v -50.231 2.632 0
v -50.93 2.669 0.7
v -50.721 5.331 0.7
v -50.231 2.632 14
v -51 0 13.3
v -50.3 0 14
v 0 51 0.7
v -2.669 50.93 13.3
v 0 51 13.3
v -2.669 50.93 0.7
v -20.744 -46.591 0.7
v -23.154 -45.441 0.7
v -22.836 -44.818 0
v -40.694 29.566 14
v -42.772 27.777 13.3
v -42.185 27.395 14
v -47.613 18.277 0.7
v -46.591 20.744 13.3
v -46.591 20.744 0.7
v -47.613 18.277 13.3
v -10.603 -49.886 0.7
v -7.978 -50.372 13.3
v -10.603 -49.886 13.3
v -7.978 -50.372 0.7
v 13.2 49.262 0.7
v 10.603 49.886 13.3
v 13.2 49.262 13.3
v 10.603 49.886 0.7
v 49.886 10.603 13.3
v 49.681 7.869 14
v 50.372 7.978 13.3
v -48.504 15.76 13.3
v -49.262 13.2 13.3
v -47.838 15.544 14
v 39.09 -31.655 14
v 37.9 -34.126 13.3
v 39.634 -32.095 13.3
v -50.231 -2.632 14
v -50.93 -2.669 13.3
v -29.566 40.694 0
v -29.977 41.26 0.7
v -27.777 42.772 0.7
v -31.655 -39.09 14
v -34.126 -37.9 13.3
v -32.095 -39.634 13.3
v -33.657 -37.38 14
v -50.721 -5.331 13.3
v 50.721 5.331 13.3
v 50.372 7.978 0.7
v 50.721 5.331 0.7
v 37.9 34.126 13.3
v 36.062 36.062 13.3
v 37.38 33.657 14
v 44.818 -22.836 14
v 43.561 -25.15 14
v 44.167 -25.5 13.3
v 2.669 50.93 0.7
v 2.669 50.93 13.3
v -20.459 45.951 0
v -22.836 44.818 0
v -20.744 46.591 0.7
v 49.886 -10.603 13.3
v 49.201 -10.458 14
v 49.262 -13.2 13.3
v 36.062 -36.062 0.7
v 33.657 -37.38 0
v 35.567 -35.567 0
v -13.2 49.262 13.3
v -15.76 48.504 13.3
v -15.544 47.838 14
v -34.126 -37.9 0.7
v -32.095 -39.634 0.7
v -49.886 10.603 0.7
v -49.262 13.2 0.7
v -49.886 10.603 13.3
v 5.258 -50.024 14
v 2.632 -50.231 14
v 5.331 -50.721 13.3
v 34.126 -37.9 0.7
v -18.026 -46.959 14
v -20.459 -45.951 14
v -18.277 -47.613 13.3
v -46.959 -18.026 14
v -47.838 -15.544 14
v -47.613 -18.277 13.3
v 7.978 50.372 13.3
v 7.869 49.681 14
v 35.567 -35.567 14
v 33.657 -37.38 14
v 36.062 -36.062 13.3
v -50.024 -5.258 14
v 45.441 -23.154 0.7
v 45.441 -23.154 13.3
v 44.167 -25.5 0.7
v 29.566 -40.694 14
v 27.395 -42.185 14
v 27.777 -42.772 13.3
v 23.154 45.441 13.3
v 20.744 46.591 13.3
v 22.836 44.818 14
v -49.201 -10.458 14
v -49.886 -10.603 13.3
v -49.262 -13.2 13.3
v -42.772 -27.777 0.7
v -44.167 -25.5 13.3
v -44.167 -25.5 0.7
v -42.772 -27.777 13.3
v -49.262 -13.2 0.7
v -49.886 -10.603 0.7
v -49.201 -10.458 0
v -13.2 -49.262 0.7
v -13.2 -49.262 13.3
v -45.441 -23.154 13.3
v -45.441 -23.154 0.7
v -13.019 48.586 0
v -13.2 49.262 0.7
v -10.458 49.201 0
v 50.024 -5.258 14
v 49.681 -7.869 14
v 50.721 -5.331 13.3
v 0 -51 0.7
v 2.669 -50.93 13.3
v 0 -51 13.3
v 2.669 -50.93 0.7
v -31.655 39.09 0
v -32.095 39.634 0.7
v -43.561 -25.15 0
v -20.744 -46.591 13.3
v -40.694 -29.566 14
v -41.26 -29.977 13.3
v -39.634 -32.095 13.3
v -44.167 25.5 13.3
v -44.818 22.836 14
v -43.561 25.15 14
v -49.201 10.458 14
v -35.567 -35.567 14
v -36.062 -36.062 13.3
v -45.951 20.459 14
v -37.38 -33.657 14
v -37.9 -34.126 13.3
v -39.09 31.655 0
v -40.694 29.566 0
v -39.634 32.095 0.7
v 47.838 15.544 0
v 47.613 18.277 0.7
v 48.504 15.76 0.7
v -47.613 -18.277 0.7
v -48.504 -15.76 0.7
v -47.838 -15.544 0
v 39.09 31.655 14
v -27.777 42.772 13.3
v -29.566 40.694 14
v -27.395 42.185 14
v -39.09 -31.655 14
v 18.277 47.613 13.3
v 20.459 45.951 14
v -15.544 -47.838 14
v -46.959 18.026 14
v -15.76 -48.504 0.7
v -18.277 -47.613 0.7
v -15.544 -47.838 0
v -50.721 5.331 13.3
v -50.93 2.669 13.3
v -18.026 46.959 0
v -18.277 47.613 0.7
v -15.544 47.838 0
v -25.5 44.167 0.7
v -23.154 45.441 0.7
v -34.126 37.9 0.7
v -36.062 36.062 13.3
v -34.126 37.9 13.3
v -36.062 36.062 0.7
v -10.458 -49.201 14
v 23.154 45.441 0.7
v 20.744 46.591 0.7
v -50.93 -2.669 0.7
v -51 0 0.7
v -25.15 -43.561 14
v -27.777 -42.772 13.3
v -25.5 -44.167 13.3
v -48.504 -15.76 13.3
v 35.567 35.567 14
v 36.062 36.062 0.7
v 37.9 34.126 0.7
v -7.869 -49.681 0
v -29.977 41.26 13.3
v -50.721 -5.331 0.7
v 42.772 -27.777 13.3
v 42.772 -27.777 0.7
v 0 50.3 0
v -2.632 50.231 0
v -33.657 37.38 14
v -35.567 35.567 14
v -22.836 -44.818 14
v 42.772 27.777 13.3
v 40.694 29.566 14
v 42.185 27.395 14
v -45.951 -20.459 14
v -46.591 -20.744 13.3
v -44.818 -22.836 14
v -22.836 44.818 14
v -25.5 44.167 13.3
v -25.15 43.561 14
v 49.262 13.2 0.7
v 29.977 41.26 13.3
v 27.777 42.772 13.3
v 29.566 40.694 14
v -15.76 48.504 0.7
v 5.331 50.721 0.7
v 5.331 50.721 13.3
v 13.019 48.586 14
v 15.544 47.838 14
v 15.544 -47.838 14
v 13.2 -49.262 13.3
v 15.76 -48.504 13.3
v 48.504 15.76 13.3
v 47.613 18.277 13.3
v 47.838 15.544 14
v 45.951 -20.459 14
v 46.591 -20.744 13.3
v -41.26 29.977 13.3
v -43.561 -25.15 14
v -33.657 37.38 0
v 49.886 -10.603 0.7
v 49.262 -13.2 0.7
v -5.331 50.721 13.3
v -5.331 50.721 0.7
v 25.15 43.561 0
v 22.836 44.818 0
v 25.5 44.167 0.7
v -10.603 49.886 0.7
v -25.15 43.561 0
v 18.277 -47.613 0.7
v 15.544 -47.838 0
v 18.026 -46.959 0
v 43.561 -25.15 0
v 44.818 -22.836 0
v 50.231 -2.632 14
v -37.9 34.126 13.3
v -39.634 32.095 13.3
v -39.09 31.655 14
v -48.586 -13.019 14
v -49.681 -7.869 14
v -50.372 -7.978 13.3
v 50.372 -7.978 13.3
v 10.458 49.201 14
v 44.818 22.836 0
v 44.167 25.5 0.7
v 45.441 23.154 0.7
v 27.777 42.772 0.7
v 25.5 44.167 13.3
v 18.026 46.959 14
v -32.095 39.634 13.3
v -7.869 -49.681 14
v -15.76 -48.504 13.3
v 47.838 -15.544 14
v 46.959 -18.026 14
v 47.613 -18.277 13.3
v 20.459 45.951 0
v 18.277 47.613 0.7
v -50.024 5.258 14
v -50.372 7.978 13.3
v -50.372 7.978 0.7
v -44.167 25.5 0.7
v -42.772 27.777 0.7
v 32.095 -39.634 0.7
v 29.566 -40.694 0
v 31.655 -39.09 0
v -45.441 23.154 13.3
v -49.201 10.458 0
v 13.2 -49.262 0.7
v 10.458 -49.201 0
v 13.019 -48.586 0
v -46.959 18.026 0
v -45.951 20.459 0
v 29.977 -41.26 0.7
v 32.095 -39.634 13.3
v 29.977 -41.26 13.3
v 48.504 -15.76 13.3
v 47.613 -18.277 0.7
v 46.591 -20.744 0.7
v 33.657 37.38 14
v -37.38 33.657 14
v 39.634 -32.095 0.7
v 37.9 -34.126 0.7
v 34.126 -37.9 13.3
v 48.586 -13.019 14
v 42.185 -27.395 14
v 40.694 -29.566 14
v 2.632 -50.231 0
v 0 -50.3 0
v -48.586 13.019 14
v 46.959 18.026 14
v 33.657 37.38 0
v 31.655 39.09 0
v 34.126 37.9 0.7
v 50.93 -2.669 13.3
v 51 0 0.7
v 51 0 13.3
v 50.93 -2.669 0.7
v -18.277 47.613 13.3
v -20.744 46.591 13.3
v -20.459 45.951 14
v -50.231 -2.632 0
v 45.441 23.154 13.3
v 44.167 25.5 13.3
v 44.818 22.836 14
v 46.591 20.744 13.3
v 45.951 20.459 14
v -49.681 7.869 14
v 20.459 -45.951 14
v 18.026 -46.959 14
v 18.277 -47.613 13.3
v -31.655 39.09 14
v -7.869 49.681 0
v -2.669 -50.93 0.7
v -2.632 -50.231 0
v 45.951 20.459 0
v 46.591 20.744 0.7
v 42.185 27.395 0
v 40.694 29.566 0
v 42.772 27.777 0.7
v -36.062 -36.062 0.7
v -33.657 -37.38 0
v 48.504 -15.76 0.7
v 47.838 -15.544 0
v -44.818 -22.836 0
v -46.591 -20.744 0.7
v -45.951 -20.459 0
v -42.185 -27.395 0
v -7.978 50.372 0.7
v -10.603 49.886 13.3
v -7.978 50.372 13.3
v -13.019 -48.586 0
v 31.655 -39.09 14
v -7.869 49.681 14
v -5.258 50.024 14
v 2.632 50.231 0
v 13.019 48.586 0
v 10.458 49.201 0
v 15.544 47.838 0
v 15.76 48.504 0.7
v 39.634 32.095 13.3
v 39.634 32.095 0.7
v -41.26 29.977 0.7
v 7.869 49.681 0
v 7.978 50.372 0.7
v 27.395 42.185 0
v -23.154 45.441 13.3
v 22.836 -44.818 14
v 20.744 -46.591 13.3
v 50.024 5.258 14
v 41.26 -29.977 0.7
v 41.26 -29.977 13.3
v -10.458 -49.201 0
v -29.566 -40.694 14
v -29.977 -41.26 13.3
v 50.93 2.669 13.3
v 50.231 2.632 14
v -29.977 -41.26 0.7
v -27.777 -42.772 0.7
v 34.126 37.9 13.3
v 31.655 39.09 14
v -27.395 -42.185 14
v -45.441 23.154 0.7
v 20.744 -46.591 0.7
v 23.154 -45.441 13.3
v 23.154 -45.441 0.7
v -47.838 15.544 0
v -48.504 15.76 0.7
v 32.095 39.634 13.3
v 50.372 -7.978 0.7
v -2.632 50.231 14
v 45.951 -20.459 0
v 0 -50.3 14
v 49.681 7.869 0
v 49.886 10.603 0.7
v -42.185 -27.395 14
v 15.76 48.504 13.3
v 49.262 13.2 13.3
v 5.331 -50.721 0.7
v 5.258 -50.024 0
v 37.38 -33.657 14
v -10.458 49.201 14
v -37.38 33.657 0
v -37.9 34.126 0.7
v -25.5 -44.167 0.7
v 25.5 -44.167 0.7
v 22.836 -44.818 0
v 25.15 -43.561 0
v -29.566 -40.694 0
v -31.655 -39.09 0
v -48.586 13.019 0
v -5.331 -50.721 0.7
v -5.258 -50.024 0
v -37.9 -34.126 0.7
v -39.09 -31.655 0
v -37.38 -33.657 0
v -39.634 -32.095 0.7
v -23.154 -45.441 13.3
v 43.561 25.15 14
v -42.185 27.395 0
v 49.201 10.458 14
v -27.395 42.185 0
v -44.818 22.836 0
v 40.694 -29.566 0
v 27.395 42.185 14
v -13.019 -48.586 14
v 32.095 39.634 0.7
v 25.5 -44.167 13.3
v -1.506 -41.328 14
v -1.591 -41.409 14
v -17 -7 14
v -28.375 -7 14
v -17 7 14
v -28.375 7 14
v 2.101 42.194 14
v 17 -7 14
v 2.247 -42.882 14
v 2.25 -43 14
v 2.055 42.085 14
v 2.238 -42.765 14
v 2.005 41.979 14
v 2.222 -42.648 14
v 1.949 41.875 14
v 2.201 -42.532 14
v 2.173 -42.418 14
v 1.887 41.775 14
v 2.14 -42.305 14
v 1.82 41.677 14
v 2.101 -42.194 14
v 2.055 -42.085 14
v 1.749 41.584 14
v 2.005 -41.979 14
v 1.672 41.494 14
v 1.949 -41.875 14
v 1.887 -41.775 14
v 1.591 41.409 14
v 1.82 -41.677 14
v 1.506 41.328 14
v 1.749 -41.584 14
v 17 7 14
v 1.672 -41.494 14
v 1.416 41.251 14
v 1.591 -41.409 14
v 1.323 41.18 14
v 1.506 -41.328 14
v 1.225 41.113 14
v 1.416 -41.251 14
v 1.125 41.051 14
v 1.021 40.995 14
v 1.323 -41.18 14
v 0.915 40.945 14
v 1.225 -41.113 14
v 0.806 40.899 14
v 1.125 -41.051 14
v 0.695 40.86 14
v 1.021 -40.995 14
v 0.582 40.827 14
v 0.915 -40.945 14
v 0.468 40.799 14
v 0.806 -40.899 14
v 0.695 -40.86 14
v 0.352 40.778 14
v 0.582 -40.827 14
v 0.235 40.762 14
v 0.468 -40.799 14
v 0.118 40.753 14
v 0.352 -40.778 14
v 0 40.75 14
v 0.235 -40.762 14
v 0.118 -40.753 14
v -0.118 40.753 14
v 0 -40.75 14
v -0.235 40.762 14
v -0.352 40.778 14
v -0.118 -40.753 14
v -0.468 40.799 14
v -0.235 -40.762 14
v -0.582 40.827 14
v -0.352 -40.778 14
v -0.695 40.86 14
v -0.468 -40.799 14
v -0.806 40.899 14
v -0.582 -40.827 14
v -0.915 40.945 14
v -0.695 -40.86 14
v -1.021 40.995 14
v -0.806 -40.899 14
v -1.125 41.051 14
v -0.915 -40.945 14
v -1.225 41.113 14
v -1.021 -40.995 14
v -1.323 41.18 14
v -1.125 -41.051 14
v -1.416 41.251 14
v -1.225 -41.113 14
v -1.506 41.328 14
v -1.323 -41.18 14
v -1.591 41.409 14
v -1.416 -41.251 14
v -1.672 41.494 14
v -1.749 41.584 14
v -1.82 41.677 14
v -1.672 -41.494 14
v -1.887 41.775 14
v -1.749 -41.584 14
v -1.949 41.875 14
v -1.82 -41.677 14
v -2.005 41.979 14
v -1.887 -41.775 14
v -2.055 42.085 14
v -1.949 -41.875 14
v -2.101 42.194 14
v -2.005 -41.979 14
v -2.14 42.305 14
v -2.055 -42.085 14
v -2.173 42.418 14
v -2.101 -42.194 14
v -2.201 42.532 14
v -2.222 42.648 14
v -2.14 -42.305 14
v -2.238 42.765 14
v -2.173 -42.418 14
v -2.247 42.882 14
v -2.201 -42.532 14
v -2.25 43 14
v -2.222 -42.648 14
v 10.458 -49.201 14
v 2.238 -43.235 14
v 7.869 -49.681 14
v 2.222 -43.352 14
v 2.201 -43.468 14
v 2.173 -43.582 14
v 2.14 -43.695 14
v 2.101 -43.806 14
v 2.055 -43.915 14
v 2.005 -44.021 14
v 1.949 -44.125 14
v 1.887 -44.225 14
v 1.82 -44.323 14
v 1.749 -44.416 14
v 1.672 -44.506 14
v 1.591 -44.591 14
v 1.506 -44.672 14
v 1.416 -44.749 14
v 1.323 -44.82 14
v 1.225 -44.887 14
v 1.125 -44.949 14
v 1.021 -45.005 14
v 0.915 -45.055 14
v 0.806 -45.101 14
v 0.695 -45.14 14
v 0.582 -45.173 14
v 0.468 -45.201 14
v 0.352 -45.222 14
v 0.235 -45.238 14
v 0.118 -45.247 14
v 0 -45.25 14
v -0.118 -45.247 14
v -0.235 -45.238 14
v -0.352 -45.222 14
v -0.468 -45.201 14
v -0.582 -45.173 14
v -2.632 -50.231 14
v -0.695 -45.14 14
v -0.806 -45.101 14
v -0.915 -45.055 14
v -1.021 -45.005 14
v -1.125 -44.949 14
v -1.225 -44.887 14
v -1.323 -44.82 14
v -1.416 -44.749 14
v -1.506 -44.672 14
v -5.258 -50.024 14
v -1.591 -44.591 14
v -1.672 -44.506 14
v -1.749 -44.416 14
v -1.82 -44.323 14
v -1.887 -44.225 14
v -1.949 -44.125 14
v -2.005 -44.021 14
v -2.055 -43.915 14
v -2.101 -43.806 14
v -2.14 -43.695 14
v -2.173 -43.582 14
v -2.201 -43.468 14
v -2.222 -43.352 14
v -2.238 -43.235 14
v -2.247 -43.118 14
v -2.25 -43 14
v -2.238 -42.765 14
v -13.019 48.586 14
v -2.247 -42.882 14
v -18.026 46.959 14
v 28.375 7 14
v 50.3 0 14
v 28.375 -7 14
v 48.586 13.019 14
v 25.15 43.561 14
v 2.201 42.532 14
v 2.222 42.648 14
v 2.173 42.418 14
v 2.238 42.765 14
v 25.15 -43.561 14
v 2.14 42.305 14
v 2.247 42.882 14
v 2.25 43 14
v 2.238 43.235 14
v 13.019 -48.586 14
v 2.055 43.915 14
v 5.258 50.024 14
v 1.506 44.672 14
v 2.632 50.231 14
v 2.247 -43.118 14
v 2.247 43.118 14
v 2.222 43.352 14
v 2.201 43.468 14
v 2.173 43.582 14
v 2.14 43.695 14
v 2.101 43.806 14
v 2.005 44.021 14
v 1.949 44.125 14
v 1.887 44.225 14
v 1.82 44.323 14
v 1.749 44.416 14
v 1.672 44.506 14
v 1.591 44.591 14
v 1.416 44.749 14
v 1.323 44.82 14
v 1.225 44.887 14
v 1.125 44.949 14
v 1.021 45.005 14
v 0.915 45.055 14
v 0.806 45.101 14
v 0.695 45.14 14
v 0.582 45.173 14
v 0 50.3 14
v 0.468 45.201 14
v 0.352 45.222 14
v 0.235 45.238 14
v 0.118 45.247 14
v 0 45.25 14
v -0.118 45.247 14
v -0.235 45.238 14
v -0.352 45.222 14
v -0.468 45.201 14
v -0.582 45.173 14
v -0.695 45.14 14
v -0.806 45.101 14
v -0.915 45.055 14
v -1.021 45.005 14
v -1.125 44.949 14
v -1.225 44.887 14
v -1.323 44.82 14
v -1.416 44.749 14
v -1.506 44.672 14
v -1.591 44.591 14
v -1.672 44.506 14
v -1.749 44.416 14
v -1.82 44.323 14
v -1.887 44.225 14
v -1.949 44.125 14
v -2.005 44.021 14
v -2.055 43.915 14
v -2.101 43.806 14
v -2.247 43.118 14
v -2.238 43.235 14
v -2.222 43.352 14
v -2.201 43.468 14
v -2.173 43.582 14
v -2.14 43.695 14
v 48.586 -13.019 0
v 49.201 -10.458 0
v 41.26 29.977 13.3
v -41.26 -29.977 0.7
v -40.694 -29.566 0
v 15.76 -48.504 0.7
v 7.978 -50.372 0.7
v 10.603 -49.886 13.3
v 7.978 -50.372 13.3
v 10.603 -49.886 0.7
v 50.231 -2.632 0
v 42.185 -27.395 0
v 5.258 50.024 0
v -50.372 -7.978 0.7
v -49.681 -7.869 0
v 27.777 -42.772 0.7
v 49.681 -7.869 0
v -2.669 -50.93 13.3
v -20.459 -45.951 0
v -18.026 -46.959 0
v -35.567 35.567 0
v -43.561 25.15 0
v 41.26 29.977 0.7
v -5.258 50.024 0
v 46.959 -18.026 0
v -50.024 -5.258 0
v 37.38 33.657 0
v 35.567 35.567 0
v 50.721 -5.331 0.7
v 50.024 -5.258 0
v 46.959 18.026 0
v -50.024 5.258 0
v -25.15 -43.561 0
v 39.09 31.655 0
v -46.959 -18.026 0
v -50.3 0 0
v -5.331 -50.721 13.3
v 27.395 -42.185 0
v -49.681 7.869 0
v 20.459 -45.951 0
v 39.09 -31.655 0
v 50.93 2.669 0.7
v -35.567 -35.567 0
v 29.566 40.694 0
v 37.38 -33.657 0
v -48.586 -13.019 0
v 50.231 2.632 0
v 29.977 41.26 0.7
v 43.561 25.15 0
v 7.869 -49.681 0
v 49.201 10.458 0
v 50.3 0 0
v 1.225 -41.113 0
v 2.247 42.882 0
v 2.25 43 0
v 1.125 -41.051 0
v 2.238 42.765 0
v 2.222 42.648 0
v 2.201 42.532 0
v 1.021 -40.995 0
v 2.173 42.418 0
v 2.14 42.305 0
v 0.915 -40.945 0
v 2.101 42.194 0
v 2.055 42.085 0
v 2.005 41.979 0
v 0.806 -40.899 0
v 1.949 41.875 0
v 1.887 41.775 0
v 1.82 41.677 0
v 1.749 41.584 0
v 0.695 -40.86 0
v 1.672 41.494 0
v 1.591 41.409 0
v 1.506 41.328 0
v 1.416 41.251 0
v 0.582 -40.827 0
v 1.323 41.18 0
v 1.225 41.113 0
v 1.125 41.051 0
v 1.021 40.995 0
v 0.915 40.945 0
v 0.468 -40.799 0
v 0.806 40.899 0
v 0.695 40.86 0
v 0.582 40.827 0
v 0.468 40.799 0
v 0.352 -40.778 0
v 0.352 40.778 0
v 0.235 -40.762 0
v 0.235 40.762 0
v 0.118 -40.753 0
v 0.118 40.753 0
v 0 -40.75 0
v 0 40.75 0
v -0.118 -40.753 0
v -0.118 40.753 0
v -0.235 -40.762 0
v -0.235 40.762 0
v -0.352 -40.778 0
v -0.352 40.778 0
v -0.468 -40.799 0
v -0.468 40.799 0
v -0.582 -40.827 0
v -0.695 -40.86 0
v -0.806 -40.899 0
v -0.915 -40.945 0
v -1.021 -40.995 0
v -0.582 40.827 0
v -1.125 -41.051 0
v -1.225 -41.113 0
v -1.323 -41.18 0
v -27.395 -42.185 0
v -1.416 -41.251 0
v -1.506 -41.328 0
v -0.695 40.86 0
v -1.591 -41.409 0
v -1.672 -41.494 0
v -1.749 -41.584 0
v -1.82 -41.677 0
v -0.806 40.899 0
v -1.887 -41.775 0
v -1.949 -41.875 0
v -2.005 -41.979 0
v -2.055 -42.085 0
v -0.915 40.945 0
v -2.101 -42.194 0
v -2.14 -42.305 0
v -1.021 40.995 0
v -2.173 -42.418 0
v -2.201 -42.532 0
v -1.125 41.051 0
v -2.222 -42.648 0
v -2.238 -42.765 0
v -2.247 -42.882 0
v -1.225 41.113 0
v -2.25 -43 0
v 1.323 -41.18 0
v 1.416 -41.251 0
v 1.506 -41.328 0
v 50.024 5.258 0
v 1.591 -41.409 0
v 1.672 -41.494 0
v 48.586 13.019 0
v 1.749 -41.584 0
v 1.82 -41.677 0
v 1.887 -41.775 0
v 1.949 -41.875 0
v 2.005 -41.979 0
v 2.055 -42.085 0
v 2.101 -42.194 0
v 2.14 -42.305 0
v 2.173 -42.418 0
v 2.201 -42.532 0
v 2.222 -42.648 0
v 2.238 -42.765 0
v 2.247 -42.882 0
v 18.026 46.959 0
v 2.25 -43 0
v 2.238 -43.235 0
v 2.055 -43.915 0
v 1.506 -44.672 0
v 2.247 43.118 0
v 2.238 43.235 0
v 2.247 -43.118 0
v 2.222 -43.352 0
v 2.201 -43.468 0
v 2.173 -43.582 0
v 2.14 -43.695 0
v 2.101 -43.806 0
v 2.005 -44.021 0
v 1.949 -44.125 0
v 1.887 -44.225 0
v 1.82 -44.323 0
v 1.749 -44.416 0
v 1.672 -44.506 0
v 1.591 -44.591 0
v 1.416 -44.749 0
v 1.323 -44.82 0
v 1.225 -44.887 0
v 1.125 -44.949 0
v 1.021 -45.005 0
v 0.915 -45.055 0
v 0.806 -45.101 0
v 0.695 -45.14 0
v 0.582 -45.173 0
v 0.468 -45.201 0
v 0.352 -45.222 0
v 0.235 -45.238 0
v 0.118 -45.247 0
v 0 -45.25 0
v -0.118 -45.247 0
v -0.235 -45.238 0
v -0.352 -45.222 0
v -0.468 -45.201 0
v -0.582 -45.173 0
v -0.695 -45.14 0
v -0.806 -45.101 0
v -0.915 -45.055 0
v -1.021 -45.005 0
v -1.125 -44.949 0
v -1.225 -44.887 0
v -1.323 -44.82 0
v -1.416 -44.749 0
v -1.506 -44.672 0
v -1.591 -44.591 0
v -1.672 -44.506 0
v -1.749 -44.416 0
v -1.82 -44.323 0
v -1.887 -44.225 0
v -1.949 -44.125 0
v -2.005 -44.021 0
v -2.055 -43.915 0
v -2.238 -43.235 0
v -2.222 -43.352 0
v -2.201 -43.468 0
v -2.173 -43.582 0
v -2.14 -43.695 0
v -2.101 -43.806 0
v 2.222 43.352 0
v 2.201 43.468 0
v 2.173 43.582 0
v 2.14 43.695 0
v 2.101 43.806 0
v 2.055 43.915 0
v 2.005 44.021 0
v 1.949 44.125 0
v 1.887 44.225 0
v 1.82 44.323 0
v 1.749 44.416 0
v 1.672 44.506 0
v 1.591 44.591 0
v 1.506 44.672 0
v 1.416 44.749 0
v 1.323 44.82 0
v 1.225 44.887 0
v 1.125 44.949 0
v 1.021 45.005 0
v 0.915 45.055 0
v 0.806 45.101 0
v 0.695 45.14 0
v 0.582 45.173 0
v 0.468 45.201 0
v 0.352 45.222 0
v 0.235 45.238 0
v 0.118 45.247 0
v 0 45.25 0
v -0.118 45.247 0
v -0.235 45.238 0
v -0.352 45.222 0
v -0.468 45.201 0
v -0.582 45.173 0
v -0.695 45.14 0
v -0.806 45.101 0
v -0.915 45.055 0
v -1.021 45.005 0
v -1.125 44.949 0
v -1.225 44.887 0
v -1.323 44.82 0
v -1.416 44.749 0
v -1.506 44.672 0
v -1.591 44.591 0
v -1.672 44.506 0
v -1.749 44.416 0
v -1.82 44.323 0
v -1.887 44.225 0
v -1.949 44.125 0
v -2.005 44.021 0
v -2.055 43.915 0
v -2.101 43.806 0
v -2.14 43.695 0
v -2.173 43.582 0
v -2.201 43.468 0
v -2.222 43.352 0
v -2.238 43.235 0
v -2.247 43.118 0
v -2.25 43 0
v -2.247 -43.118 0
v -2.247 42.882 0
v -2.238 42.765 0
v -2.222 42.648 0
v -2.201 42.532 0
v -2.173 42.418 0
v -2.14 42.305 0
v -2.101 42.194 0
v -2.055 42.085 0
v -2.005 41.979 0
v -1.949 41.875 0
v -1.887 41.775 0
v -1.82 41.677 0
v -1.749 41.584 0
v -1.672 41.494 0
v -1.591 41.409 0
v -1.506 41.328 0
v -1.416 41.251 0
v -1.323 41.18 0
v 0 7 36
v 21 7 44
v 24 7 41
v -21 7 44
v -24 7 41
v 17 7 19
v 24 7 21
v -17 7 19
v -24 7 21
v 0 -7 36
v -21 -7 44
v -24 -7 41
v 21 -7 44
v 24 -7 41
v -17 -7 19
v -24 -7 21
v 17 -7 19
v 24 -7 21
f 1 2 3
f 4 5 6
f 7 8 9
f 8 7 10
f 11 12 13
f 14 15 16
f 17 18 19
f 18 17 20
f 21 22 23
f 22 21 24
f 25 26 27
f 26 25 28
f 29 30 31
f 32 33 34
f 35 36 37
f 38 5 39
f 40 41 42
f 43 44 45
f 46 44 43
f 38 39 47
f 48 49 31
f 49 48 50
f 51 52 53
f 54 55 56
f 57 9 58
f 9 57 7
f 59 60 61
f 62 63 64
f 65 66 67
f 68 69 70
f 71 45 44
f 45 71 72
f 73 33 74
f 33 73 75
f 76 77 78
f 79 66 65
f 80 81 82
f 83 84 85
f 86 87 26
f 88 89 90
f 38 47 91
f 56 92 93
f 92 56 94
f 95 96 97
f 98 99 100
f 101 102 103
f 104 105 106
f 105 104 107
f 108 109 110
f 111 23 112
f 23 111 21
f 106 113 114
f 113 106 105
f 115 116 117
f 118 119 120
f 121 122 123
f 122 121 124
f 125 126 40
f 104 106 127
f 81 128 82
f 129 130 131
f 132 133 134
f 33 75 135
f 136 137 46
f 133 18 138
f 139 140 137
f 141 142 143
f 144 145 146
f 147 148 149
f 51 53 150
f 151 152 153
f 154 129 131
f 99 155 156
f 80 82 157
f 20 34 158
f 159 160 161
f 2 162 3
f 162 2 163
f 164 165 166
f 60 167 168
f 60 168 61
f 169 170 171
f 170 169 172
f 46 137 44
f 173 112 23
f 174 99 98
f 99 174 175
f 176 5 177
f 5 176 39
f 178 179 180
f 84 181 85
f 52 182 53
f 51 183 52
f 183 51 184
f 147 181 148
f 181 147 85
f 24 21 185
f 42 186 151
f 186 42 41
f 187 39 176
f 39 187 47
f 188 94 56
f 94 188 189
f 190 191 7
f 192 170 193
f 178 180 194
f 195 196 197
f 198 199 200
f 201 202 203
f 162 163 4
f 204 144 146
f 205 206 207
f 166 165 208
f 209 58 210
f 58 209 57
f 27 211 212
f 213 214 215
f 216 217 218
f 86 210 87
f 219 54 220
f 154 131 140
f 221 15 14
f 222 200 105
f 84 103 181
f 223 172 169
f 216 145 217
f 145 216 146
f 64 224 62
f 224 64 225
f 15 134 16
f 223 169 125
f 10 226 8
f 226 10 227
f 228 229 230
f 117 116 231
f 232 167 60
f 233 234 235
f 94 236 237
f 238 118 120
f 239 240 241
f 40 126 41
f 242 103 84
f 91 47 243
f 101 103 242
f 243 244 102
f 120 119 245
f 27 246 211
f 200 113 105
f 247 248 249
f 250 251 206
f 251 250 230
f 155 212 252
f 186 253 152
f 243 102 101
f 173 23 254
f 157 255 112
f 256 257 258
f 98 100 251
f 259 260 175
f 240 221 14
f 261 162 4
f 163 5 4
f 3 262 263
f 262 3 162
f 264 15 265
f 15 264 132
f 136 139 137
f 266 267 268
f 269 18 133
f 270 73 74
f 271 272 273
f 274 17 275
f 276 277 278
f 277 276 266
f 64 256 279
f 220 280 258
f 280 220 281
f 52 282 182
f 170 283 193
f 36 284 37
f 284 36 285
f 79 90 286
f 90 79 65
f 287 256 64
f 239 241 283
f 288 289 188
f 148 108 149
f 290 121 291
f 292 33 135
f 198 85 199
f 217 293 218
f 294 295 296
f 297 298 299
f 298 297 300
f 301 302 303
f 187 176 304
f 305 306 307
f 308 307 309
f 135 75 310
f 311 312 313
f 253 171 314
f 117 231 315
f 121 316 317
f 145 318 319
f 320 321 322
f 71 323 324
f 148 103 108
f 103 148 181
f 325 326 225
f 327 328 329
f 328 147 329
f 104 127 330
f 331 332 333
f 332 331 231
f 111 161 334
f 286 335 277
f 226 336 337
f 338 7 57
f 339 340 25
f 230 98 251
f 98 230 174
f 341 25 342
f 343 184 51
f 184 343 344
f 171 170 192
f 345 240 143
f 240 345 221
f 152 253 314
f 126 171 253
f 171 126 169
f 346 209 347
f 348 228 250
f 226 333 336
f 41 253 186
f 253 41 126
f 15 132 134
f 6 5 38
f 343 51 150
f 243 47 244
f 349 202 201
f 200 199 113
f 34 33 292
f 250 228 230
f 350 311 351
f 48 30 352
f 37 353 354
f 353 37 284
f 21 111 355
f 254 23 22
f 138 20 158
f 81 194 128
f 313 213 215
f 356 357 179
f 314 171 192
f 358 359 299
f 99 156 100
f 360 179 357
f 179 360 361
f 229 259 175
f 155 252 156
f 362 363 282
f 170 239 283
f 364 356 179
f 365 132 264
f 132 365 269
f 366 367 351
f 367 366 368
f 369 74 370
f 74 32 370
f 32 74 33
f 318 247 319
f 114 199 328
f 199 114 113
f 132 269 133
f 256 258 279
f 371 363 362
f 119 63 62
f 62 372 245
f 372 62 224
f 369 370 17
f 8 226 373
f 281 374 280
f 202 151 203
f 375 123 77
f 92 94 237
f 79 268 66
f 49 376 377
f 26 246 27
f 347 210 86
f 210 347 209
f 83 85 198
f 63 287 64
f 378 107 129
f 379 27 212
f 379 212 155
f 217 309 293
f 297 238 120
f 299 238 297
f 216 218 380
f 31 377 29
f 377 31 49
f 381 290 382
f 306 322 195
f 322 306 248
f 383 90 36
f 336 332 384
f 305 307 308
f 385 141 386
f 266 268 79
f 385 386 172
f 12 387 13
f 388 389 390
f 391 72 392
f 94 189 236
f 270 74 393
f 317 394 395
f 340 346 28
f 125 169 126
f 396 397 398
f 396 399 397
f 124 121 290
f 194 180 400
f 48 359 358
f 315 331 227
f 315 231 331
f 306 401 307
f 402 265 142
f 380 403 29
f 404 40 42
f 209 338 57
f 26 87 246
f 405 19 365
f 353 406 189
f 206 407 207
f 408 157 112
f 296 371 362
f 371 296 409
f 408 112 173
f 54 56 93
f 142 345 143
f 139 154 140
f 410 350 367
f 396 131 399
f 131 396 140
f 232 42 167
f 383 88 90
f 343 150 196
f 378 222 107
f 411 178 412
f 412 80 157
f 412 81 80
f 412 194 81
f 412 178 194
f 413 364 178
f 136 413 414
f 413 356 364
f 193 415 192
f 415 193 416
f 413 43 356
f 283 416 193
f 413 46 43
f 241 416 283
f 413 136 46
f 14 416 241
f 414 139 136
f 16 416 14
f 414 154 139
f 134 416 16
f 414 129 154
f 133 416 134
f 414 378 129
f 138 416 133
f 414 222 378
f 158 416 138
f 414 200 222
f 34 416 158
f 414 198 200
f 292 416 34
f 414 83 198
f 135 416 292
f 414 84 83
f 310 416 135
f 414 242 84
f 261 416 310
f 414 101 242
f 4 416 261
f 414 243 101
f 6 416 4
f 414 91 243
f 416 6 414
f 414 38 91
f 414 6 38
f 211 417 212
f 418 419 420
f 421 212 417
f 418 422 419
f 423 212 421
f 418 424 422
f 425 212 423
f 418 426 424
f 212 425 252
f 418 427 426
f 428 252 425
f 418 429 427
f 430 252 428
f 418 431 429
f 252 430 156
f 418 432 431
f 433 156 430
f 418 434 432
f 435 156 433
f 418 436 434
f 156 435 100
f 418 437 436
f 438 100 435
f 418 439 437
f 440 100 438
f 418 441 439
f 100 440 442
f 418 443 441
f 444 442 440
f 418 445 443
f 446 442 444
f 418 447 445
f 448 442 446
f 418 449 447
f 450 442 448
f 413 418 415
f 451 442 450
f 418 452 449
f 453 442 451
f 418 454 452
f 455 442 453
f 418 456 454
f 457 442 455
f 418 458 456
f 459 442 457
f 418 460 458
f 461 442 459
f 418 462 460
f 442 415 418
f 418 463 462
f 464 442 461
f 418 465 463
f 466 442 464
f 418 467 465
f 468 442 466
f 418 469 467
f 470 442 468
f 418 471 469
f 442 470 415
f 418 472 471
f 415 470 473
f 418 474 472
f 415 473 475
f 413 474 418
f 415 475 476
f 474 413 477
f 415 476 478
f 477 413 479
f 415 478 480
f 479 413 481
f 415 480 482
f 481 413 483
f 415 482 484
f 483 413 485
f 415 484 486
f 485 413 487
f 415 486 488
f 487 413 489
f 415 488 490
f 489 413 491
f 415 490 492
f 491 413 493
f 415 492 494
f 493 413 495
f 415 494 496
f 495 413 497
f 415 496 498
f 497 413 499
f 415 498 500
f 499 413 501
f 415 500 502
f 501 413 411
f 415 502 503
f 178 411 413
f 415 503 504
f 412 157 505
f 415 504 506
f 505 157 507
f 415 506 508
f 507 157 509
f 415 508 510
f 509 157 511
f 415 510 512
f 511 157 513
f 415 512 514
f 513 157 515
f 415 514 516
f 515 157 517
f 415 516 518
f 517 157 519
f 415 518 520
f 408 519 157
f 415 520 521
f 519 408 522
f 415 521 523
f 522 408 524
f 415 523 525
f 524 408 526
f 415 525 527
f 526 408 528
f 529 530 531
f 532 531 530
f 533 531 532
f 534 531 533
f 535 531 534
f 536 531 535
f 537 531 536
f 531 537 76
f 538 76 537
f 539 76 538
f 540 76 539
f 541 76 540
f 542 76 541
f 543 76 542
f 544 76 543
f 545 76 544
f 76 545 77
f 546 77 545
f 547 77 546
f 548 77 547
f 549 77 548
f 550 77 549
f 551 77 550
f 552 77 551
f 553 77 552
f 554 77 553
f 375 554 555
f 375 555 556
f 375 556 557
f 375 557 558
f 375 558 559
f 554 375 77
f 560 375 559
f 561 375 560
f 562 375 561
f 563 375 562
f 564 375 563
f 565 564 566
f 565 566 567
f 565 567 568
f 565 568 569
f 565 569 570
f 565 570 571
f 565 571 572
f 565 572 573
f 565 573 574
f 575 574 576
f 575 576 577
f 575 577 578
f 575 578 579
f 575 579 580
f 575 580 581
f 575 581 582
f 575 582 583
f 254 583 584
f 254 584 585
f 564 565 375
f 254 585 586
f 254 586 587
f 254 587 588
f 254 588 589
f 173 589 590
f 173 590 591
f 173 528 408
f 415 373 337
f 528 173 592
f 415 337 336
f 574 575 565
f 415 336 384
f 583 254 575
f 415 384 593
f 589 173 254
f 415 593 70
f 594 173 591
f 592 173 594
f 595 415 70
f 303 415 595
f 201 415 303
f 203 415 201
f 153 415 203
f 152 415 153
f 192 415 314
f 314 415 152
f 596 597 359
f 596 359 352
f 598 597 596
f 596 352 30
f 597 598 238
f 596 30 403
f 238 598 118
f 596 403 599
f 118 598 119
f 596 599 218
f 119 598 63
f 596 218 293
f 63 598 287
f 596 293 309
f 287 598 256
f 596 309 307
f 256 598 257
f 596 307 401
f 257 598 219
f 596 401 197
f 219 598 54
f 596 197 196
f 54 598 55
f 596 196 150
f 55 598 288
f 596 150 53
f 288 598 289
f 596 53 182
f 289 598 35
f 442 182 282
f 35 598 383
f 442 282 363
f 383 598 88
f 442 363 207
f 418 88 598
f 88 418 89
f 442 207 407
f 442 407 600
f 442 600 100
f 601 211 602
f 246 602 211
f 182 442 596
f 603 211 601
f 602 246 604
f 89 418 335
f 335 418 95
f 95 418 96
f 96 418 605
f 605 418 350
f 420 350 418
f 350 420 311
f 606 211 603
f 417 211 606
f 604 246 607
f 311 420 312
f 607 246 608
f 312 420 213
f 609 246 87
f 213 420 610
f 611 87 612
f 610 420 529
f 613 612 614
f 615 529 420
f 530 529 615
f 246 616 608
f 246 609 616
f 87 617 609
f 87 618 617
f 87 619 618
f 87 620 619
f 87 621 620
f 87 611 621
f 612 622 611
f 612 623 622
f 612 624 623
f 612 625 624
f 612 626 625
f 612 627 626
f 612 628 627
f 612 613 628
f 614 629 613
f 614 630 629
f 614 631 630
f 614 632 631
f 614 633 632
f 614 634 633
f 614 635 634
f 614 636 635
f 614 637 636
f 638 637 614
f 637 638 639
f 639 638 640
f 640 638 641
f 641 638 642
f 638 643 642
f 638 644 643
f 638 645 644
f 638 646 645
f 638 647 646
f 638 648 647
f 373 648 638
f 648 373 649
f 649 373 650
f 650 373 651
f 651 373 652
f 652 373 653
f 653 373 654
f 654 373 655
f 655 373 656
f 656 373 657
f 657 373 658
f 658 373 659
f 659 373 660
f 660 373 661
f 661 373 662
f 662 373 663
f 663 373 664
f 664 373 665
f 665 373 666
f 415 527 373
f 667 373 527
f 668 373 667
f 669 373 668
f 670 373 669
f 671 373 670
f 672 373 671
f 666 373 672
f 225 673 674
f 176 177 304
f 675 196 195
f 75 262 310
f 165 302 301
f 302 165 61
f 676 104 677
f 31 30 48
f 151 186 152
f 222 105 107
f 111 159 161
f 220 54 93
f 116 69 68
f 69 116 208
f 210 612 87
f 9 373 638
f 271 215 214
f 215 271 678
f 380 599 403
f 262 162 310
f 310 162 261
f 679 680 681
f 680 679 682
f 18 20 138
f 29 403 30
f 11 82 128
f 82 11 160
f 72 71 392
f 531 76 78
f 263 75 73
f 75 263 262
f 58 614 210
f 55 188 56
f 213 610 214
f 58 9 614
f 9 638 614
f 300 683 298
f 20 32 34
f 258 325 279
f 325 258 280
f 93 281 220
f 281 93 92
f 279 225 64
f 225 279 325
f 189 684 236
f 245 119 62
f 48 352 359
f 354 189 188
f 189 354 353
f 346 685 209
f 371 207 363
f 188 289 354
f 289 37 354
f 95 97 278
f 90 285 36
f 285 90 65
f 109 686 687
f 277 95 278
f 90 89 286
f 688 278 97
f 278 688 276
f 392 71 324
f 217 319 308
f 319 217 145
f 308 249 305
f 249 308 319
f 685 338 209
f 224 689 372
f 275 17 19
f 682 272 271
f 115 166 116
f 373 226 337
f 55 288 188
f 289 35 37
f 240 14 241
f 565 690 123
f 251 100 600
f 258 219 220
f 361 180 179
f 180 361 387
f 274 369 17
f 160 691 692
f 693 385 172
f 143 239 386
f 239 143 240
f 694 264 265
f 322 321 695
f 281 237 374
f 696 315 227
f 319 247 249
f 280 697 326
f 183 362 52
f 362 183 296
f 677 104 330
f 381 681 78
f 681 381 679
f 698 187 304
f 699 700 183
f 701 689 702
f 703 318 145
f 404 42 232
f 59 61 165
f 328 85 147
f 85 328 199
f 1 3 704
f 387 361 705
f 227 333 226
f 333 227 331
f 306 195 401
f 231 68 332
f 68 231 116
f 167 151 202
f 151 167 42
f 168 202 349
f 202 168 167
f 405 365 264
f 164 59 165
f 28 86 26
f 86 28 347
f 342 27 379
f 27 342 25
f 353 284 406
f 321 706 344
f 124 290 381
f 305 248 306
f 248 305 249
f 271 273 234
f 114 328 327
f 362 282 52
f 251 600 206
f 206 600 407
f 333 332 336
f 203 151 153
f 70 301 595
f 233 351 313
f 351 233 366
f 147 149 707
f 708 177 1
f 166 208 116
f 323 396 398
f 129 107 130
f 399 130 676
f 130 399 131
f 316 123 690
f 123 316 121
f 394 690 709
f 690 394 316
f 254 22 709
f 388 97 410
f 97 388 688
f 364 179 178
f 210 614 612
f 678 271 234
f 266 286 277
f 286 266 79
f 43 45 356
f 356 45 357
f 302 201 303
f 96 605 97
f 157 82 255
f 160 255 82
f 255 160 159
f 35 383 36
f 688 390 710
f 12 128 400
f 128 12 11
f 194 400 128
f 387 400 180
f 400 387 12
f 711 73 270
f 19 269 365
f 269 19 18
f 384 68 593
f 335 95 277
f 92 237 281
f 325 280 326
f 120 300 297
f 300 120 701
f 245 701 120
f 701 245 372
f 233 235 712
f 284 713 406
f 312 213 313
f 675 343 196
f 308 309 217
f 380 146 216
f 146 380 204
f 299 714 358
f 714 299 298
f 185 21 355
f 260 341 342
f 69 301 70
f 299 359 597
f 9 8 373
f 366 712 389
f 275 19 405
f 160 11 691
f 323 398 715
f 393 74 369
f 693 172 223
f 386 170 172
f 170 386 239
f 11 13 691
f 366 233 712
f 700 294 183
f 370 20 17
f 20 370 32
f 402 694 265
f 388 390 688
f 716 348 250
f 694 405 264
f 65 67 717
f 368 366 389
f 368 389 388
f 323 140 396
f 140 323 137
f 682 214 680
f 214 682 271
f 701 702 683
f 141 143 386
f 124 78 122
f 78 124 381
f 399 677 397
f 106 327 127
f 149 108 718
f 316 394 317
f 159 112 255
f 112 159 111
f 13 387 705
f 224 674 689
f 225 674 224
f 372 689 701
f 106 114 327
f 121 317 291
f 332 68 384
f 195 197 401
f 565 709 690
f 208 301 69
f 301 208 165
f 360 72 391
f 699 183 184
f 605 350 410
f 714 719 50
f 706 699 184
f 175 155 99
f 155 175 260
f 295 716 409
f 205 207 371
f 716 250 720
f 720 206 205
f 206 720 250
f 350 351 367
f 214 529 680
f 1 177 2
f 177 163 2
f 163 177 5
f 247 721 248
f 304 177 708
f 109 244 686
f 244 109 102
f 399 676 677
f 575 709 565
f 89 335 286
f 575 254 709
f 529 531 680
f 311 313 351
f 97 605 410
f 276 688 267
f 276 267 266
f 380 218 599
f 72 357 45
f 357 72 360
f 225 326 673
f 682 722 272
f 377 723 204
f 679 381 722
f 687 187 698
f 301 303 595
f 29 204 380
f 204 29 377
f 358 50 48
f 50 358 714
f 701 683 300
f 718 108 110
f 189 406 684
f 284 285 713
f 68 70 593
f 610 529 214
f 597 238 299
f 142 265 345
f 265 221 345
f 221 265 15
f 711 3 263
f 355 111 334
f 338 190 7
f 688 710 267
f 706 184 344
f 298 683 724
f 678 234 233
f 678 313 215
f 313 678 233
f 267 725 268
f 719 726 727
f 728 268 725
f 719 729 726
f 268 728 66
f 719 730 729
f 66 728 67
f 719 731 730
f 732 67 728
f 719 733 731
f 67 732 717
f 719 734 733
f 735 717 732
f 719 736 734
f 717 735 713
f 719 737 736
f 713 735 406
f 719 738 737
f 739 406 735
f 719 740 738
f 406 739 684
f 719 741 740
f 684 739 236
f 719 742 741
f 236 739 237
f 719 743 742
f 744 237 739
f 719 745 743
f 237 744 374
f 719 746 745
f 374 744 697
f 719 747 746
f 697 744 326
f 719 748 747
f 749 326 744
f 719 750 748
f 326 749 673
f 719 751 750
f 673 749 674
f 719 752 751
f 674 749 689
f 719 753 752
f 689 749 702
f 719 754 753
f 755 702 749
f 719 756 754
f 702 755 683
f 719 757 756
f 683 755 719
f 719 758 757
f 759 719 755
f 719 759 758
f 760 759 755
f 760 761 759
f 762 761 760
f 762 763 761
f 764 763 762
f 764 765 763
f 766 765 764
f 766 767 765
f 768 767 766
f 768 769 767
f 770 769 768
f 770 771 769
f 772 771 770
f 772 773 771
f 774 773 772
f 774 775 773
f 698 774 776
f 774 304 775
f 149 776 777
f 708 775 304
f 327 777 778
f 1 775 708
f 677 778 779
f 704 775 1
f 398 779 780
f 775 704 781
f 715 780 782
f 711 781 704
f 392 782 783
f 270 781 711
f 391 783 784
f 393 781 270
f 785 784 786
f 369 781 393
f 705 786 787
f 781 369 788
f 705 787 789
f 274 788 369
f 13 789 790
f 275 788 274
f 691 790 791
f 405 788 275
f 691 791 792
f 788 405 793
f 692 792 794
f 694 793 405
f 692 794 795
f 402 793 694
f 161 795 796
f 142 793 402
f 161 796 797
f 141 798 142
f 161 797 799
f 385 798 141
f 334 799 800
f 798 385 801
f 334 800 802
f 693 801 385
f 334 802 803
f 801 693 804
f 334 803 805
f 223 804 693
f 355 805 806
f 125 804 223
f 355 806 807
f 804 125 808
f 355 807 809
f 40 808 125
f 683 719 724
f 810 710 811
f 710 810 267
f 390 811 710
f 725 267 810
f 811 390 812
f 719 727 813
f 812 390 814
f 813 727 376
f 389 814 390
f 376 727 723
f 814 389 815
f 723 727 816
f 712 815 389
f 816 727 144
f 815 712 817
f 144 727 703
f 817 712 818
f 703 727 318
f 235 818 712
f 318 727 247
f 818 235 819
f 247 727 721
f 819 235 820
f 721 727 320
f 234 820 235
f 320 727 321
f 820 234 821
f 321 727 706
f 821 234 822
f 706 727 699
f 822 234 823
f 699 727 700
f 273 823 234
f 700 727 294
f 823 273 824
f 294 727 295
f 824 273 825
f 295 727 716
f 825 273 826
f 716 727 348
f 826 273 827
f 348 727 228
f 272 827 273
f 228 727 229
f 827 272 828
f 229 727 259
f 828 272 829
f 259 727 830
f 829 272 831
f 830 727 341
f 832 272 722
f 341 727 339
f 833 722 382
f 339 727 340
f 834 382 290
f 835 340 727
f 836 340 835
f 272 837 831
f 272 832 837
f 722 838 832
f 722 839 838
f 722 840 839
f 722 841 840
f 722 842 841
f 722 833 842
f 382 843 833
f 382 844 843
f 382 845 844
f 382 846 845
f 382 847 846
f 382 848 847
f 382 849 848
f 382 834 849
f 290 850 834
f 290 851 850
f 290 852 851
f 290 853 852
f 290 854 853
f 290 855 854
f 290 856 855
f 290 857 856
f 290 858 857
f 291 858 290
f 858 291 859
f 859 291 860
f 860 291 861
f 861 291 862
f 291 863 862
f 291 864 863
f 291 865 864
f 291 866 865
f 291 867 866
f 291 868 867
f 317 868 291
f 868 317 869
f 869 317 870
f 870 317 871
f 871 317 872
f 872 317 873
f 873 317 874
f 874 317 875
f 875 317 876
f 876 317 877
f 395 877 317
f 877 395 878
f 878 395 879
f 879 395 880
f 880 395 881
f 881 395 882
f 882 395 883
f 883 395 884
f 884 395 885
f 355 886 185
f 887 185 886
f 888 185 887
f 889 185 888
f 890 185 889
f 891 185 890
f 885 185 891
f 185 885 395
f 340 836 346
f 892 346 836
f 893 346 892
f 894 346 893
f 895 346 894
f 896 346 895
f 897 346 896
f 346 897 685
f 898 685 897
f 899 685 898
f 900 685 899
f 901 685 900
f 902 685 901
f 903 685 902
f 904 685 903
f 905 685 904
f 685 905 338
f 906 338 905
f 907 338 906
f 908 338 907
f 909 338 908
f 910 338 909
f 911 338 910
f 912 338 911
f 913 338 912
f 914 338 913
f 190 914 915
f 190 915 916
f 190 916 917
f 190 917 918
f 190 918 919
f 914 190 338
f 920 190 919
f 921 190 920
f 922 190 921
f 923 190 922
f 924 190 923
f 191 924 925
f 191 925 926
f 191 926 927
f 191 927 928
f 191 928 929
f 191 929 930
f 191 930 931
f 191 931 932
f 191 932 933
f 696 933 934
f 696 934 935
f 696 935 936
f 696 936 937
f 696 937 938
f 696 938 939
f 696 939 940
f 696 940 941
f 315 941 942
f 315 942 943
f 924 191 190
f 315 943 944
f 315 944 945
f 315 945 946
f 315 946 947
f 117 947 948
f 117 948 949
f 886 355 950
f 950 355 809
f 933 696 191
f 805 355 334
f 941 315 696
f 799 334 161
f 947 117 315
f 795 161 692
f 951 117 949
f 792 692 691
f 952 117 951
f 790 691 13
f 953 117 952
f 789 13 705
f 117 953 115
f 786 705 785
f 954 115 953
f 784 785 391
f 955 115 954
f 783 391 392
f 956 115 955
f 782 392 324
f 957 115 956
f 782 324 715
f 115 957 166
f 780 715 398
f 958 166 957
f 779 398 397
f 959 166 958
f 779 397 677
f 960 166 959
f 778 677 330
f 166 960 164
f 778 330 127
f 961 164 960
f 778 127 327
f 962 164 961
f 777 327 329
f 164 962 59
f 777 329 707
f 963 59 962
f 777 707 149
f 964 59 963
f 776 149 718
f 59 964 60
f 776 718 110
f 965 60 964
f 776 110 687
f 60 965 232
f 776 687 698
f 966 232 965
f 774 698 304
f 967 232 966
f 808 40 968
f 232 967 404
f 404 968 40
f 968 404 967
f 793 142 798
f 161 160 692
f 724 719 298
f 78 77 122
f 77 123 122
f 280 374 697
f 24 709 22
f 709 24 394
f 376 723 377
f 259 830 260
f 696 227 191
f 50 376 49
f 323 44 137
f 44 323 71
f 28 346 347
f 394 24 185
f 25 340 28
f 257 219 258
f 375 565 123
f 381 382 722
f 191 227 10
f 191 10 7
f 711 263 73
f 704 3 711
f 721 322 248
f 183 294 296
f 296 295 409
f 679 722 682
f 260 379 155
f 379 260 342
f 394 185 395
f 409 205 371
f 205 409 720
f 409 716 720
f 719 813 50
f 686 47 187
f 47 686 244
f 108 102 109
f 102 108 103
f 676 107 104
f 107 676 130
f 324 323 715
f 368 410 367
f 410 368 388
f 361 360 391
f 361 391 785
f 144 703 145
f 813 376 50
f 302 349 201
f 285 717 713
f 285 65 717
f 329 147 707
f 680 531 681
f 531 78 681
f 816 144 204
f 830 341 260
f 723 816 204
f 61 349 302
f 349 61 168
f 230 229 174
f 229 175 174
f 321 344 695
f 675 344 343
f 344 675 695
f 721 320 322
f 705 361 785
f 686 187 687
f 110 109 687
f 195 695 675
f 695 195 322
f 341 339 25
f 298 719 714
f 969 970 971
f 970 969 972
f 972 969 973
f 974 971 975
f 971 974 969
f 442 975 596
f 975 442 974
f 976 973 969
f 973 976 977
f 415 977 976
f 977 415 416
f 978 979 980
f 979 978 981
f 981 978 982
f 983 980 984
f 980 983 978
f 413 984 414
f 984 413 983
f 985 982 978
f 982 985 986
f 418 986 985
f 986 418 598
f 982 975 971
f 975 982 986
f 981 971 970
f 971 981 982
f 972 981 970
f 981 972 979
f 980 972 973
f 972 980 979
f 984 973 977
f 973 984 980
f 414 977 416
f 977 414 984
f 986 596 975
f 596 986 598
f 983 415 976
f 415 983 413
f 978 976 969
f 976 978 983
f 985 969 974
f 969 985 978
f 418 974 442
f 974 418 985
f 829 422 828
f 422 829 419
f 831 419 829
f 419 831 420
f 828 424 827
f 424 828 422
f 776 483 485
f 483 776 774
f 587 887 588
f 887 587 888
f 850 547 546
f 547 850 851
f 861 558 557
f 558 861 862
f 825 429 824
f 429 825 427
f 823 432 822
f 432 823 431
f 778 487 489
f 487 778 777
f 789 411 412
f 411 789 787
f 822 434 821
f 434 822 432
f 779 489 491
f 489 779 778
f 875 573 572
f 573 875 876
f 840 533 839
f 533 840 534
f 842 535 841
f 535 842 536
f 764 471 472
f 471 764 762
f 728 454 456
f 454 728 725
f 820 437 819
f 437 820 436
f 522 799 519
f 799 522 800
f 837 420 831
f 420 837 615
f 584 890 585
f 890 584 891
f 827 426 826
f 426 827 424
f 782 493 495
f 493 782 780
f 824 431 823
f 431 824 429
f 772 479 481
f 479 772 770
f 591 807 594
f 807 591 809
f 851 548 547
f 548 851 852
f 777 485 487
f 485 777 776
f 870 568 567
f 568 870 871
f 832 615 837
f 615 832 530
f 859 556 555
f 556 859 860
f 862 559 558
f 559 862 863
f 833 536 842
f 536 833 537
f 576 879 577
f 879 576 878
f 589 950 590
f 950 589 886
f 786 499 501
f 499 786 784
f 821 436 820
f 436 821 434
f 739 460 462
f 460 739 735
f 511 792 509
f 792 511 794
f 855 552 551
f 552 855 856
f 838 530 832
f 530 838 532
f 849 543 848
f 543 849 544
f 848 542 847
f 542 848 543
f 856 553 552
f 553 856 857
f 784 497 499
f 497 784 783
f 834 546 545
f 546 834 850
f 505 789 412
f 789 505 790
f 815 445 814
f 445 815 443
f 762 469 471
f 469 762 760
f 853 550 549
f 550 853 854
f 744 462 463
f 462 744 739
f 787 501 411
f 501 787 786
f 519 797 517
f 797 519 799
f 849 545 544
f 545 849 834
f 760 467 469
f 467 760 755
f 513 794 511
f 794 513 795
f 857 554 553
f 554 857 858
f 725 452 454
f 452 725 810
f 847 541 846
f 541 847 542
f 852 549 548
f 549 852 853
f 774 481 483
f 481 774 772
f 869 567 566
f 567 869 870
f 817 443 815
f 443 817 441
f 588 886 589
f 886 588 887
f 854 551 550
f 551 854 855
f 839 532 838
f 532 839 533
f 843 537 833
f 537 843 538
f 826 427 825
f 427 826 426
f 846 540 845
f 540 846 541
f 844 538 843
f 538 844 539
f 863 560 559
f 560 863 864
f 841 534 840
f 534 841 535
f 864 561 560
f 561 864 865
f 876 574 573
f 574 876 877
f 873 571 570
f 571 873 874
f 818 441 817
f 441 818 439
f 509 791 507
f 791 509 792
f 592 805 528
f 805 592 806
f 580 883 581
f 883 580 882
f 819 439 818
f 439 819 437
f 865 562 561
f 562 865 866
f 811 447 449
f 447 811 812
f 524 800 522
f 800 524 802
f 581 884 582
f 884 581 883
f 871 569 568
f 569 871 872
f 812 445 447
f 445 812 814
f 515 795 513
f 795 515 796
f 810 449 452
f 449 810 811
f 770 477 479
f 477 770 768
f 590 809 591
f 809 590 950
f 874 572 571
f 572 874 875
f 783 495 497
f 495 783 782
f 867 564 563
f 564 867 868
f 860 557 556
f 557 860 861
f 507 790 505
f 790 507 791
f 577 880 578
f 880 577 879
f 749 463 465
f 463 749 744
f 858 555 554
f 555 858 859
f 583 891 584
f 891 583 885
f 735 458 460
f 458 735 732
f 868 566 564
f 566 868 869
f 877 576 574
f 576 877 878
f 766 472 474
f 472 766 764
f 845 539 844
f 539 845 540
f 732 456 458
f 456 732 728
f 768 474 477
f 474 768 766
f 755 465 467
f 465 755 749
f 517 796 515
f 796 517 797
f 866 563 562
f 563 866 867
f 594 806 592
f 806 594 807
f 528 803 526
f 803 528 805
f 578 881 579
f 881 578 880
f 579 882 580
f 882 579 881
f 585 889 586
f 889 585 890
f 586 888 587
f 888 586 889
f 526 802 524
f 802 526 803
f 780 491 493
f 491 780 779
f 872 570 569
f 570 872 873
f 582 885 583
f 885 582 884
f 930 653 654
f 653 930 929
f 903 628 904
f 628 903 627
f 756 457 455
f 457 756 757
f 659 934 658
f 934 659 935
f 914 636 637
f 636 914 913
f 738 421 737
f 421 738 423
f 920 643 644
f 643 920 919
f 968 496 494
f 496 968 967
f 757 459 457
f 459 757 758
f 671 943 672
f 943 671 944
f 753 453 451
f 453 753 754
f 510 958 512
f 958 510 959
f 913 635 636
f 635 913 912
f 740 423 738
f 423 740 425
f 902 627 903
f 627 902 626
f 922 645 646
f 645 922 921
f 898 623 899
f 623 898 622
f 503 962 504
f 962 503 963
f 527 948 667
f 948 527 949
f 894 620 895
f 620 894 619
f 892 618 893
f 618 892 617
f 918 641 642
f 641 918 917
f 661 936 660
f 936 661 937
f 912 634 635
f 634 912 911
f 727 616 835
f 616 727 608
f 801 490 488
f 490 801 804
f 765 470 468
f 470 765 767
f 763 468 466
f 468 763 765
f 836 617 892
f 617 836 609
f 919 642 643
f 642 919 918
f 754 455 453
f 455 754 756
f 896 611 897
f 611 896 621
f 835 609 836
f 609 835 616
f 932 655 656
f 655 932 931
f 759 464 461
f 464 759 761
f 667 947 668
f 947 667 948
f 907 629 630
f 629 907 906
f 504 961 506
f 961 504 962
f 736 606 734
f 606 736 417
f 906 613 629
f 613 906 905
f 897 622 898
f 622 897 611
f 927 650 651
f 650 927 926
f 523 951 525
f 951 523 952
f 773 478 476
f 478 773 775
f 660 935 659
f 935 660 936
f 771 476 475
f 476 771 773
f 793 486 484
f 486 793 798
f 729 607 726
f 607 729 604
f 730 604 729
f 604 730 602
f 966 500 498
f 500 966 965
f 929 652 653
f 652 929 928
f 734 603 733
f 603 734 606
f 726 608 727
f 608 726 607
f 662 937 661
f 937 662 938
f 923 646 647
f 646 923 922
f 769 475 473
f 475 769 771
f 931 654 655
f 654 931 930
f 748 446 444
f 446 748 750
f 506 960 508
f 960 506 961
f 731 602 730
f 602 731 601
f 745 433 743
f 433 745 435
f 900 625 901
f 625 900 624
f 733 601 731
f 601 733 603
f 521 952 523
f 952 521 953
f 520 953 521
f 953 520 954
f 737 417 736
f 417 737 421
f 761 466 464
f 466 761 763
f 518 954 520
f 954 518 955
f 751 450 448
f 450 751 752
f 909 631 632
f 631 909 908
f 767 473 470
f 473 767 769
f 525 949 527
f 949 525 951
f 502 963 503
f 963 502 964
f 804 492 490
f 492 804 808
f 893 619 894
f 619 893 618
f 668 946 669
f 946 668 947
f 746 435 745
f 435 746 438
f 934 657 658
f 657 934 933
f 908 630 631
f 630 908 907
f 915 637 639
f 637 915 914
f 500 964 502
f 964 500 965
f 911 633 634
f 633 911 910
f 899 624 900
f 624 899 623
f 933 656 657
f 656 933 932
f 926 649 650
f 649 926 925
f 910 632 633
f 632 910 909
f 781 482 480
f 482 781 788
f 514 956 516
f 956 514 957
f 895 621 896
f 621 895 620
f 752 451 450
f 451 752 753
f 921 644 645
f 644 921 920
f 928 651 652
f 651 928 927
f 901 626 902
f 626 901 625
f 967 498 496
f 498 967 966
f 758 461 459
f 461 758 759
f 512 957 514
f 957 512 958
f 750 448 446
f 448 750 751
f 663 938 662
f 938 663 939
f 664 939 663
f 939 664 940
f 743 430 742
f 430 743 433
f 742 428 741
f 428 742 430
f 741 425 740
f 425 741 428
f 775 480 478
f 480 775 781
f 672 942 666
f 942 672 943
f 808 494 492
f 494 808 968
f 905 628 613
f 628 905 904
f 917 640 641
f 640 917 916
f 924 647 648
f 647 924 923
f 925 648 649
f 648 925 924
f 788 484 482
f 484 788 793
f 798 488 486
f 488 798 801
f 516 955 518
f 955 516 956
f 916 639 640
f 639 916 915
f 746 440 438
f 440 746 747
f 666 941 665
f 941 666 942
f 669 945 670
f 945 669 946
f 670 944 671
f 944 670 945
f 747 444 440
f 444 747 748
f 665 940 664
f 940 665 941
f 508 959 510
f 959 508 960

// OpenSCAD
// Rev G | integral rear finger pull | mm
// Rear access required. Print battery-contact face down, grip up.
// Rear plate retains the Rev F M4 pattern and battery contact plane.
// Allow 30 mm behind the rear plate for the grip plus cap clearance.
// Check finger access with the rear cap removed. Use M4 washers and locknuts.
// OpenSCAD "assembly" shows the orientation. Battery shapes are approximate.
part = "rear";
bore_min = 103;
diametral_gap = 1.0;
length_axial = 40;
land_width = 8;
ring_wall = 6;
shell_wall = 7;
mid_relief = 0.35; // Radial relief between the two pipe-contact lands
rod_tube_od = 13;
deck_thickness = 10;
standoff_height = 4;
spacer_od = 9;
spacer_bore = 3.6;
screw_clearance = 3.4;
lead_chamfer = 0.7;


battery_length = 113;
rod_y = 43;
rod_hole = 4.5;
ear_radius = 5.5;
saddle_thickness = 6;
finger_length = 6;
finger_inner_y = 34; // Photo estimate, measured from tube axis
finger_width = 3;
finger_x = 22; // Contacts at battery side only
finger_depth_x = 7;
front_cable_gap = 30;
end_pad = 1;
rear_thickness = 14;
middle_bridge_x = 39;
middle_bridge_radius = 4;
grip_height = 30;
grip_thickness = 14;
grip_half_width = 29;
grip_open_half_width = 17;
grip_open_shoulder = 5;
grip_open_peak = grip_open_shoulder + grip_open_half_width;

$fn = 120;
r = (bore_min - diametral_gap) / 2;
body_length = length_axial - standoff_height;
hole_centers = [for (x = [-15, 15], y = [-31, 31]) [x, y]];
rod_positions = [-rod_y, rod_y];
pack_front = -front_cable_gap;
pack_back = pack_front - battery_length;
rear_start = pack_back - end_pad - rear_thickness;

assert(part == "middle" || part == "front" || part == "rear" ||
       part == "gauge" || part == "spacer" || part == "assembly", "Unknown part.");
assert(rod_y + rod_tube_od / 2 <= r - lead_chamfer,
       "Rod sleeves exceed the entry chamfer.");
assert(rod_y + rod_tube_od / 2 > r - mid_relief - shell_wall,
       "Rod sleeves must overlap the sidewall.");
assert(2 * (land_width + mid_relief) < body_length && deck_thickness < body_length,
       "Check front insert axial dimensions.");
assert(rod_y + ear_radius < r - lead_chamfer, "Rod ears exceed fit diameter.");
assert(norm([finger_x + finger_depth_x, finger_inner_y + finger_width]) < r,
       "Locating fingers exceed fit diameter.");
assert(rod_y - rod_hole / 2 > 31 + screw_clearance / 2,
       "Check DIN mounting hole clearance.");

echo(guide_od = 2 * r, rod_spacing = 2 * rod_y,
     assembly_length_excluding_device_and_hardware = length_axial - rear_start + grip_height);

module rod_bores(start, depth) {
    for (y = rod_positions)
        translate([0, y, start])
            cylinder(d = rod_hole, h = depth);
}

module end_land() {
    cylinder(h = lead_chamfer, r1 = r - lead_chamfer, r2 = r);
    translate([0, 0, lead_chamfer])
        cylinder(h = land_width - 2 * lead_chamfer, r = r);
    translate([0, 0, land_width - lead_chamfer])
        cylinder(h = lead_chamfer, r1 = r, r2 = r - lead_chamfer);
}

module annular_land() {
    difference() {
        end_land();
        translate([0, 0, -1])
            cylinder(h = land_width + 2, r = r - ring_wall);
    }
}

// Continuous wall carries transverse shear and torsion between the lands.
module front_outer_profile() {
    rotate_extrude()
        polygon([
            [0, 0], [r - lead_chamfer, 0], [r, lead_chamfer],
            [r, land_width], [r - mid_relief, land_width + mid_relief],
            [r - mid_relief, body_length - land_width - mid_relief],
            [r, body_length - land_width], [r, body_length - lead_chamfer],
            [r - lead_chamfer, body_length], [0, body_length]
        ]);
}

module insert() {
    difference() {
        union() {
            difference() {
                front_outer_profile();
                translate([0, 0, -1])
                    cylinder(h = body_length - deck_thickness + 1,
                             r = r - mid_relief - shell_wall);
            }
            // Full-height sleeves merge into the wall and support M4 clamping.
            for (y = rod_positions)
                translate([0, y, 0])
                    cylinder(h = body_length, d = rod_tube_od);
        }
        for (p = hole_centers)
            translate([p[0], p[1], body_length - deck_thickness - 1])
                cylinder(h = deck_thickness + 2,
                         d = screw_clearance);
        rod_bores(-1, body_length + 2);
        // Rounded corners reduce stress concentration at the cable window.
        translate([0, 0, body_length - deck_thickness - 1])
            linear_extrude(height = deck_thickness + 2)
                hull() for (x = [-10, 10], y = [-7, 7])
                    translate([x, y]) circle(r = 2);
    }
}

assert(grip_height > grip_open_peak && grip_half_width > grip_open_half_width,
       "Grip opening must leave material on top and both sides.");
assert(norm([grip_half_width, grip_thickness/2]) < r - lead_chamfer,
       "Grip must fit inside the rear plate.");

module rear_grip() {
    // Roof rises 1 mm per mm inward. Every roof layer grows from the sidewalls.
    translate([0, 0, rear_thickness])
        rotate([90, 0, 0])
            linear_extrude(height = grip_thickness, center = true)
                difference() {
                    polygon([[-grip_half_width, -1], [grip_half_width, -1],
                             [grip_half_width - 5, 7], [grip_half_width - 5, grip_height - 3],
                             [grip_half_width - 8, grip_height], [-grip_half_width + 8, grip_height],
                             [-grip_half_width + 5, grip_height - 3], [-grip_half_width + 5, 7]]);
                    polygon([[-grip_open_half_width, 0], [grip_open_half_width, 0],
                             [grip_open_half_width, grip_open_shoulder], [0, grip_open_peak],
                             [-grip_open_half_width, grip_open_shoulder]]);
                }
}

module rear_plate() {
    difference() {
        union() {
            rotate_extrude()
                polygon([[0, 0], [r-lead_chamfer, 0], [r, lead_chamfer],
                         [r, rear_thickness-lead_chamfer],
                         [r-lead_chamfer, rear_thickness], [0, rear_thickness]]);
            rear_grip();
        }
        rod_bores(-1, rear_thickness + 2);
    }
}

module middle_bracket() {
    difference() {
        union() {
            linear_extrude(height = saddle_thickness)
                union() {
                    // Move the bridge to the right of the battery indicator.
                    hull() for (side = [-1, 1])
                        translate([middle_bridge_x, side * 15])
                            circle(r = middle_bridge_radius);
                    for (side = [-1, 1]) {
                        hull() {
                            translate([0, side * rod_y]) circle(r = ear_radius);
                            translate([finger_x + finger_depth_x/2,
                                       side * (finger_inner_y - 2)]) circle(r = 4);
                        }
                        hull() {
                            translate([finger_x + finger_depth_x/2,
                                       side * (finger_inner_y - 2)]) circle(r = 4);
                            translate([middle_bridge_x, side * 15])
                                circle(r = middle_bridge_radius);
                        }
                    }
                }
            for (side = [-1, 1])
                translate([finger_x,
                           side > 0 ? finger_inner_y : -finger_inner_y-finger_width,
                           saddle_thickness - 1])
                    cube([finger_depth_x, finger_width, finger_length + 1]);
        }
        rod_bores(-1, saddle_thickness + 2);
    }
}

module spacer() {
    difference() {
        cylinder(d = spacer_od, h = standoff_height);
        translate([0, 0, -1])
            cylinder(d = spacer_bore, h = standoff_height + 2);
    }
}

module assembly() {
    color("steelblue") insert();
    for (p = hole_centers)
        color("steelblue") translate([p[0], p[1], body_length]) spacer();
    color("steelblue") translate([0, 0, rear_start + rear_thickness])
        rotate([180, 0, 0]) rear_plate();
    color("orange") translate([0, 0, pack_front + end_pad + saddle_thickness])
        rotate([180, 0, 0]) middle_bracket();
    for (y = rod_positions)
        color("silver") translate([0, y, rear_start])
            cylinder(d = 4, h = body_length - rear_start + 5);
    // Rough end-view silhouette for orientation only.
    %translate([0, 0, pack_back])
        linear_extrude(height = battery_length)
            hull() for (x = [3, 29], y = [-28, 28])
                translate([x, y]) circle(r = 5);
    %translate([0, 0, pack_front - 102])
        linear_extrude(height = 102)
            hull() for (x = [-34, -7], y = [-27, 27])
                translate([x, y]) circle(r = 5);
}

if (part == "middle") middle_bracket();
if (part == "front")
    translate([0, 0, body_length]) rotate([180, 0, 0]) insert();
if (part == "spacer") spacer();
if (part == "rear") rear_plate();
if (part == "gauge") annular_land();
if (part == "assembly") assembly();
